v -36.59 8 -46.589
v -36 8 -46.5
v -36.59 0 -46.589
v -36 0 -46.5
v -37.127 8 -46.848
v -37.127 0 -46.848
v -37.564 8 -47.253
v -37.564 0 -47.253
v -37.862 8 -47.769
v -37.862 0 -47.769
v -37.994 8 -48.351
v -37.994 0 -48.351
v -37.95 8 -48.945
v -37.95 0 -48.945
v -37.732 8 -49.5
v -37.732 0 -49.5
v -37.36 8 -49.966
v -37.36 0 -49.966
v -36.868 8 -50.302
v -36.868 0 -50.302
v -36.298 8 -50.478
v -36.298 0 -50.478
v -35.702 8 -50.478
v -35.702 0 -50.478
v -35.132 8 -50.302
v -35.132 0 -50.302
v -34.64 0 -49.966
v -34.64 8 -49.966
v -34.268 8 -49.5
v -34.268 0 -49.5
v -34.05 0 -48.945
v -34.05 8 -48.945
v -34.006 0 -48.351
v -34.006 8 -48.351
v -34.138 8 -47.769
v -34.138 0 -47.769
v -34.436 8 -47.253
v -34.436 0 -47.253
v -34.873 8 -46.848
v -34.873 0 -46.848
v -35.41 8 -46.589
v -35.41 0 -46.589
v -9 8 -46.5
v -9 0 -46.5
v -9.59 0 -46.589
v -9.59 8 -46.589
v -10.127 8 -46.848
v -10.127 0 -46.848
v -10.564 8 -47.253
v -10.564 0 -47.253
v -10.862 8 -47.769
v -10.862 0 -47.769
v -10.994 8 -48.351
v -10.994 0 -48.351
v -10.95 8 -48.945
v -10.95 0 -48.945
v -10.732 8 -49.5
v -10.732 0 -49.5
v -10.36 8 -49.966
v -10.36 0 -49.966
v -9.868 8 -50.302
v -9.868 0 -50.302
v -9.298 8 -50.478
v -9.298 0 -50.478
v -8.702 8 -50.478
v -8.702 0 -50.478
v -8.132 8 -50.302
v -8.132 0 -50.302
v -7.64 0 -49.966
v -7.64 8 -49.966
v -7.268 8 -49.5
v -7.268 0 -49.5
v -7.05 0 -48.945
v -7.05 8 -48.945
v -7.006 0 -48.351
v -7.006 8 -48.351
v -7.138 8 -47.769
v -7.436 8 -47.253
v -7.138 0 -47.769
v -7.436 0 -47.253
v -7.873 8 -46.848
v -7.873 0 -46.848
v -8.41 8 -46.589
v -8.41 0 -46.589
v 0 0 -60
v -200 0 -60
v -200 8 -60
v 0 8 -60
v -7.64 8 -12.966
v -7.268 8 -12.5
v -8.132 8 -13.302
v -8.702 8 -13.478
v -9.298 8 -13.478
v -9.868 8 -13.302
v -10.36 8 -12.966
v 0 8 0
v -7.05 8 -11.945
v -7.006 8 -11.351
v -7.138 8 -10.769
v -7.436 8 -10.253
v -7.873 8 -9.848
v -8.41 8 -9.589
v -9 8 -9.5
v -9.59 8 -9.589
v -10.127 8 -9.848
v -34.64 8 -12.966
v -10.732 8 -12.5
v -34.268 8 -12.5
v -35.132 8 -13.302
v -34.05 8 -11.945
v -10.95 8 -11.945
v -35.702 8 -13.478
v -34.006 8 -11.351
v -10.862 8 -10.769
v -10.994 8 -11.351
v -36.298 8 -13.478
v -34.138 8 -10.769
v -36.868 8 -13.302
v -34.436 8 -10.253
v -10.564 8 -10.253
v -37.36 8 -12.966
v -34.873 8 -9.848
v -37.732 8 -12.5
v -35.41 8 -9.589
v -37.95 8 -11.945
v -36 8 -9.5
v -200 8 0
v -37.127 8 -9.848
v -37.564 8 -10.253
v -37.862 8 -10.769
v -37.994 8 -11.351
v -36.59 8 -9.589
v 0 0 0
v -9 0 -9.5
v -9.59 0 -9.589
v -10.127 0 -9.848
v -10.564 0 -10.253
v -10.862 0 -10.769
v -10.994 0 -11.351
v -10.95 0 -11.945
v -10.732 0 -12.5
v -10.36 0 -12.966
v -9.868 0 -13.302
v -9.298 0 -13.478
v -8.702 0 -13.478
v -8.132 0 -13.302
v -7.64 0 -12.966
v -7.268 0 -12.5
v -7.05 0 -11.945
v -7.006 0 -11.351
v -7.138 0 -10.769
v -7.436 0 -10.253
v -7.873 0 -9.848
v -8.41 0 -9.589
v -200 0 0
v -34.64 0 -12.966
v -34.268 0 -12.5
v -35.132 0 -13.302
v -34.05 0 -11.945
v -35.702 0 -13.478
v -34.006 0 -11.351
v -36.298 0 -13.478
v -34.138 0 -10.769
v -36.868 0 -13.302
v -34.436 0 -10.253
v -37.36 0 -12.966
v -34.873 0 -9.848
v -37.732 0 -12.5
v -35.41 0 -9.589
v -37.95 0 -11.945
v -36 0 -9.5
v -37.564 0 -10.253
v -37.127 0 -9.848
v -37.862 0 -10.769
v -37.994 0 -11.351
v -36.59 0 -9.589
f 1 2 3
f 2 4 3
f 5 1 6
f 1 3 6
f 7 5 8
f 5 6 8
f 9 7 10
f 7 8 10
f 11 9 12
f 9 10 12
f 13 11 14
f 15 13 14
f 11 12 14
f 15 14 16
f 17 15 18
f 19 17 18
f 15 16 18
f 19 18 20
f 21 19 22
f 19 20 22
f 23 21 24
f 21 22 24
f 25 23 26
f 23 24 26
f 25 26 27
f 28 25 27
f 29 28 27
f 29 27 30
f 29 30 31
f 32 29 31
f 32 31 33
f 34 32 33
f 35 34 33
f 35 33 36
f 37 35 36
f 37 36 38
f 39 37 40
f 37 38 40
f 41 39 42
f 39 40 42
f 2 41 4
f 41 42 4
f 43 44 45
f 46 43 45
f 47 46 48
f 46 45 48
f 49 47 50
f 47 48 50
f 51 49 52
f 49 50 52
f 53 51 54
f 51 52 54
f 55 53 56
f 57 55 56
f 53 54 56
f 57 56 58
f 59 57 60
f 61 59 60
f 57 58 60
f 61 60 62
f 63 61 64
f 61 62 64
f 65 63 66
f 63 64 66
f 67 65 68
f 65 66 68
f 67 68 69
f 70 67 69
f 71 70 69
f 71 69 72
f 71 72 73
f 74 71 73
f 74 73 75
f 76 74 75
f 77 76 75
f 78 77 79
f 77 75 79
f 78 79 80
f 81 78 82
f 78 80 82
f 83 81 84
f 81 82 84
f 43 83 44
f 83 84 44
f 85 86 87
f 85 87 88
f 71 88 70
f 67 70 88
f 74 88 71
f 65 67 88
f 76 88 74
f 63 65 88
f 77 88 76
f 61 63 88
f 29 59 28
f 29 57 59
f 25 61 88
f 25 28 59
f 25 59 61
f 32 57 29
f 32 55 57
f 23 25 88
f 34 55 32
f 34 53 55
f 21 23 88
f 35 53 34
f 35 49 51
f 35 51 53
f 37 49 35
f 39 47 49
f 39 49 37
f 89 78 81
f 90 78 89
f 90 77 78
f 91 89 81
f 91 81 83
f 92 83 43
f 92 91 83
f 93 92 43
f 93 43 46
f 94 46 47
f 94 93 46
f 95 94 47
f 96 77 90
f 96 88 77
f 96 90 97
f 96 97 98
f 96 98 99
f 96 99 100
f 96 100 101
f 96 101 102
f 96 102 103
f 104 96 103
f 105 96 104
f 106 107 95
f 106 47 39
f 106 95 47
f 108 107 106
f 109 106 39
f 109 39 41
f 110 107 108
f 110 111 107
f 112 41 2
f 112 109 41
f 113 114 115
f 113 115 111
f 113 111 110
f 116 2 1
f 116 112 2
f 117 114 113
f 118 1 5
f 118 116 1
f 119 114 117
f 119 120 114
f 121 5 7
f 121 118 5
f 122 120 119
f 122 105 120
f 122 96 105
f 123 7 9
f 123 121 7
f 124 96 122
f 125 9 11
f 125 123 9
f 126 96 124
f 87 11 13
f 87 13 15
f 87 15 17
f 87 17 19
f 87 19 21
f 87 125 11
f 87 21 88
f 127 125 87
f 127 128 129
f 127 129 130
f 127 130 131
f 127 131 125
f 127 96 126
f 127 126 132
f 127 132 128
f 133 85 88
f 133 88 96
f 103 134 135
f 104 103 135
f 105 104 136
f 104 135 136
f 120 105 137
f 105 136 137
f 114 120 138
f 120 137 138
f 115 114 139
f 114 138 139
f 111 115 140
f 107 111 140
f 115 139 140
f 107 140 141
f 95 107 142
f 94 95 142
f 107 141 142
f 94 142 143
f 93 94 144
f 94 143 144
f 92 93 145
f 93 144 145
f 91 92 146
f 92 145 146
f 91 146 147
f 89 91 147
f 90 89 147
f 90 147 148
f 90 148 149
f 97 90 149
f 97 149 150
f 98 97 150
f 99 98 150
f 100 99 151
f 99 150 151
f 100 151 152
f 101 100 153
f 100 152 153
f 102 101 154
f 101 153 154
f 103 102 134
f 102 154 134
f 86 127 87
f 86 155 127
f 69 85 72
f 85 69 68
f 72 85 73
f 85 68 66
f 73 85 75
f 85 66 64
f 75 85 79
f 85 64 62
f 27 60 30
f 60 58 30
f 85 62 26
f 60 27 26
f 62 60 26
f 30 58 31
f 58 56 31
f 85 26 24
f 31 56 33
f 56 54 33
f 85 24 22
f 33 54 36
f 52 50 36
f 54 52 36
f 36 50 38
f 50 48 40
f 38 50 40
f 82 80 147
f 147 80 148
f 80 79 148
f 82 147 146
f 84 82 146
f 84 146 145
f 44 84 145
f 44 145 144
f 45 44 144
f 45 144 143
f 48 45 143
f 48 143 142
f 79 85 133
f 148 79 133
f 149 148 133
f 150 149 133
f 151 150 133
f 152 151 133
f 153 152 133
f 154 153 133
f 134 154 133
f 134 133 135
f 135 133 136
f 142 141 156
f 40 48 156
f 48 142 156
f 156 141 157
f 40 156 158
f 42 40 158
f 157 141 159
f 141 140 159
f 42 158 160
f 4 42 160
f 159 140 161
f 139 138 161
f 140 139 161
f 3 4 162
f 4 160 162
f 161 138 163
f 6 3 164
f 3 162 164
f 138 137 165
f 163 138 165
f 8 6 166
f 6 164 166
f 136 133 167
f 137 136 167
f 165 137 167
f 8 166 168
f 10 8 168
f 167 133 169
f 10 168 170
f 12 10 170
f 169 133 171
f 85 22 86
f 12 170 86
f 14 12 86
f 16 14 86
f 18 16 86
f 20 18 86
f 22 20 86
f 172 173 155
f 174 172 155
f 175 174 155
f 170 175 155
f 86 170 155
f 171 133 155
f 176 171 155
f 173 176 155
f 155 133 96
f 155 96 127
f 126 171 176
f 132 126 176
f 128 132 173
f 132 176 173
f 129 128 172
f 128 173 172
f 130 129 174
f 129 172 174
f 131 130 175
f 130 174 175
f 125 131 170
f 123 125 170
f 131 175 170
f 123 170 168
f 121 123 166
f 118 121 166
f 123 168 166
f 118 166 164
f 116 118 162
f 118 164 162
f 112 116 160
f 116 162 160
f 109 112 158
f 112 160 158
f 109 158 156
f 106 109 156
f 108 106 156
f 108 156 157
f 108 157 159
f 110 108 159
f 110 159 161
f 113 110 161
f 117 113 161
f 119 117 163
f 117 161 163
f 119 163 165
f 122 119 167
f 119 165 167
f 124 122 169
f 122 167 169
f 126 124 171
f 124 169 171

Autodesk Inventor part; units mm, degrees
ref_plane "YZ Plane" through (0, 0, 0) normal (1, 0, 0) x (0, 1, 0)
ref_plane "XZ Plane" through (0, 0, 0) normal (0, 1, 0) x (-1, 0, 0)
ref_plane "XY Plane" through (0, 0, 0) normal (0, 0, 1) x (1, 0, 0)
sketch "Sketch1" plane through (0, 0, 0) normal (0, 1, 0) x (-1, 0, 0)
  line L0 (0, 0) -> (200, 0)
  line L1 (200, 0) -> (200, -60)
  line L2 (200, -60) -> (0, -60)
  line L3 (0, -60) -> (0, 0)
  dimension "d0" = 200
  dimension "d1" = 60
extrude "Extrusion1" add sketch "Sketch1" along normal blind 8
sketch "Sketch2" plane through (0, 8, 0) normal (0, 1, 0) x (1, 0, 0)
  line L0 (-40, 7.5) -> (-40, 52.5)
  line L1 (-35, 42.75) -> (-35, 34.25)
  line L2 (-35, 34.25) -> (-34, 34.25)
  line L3 (-34, 34.25) -> (-34, 42.75)
  line L4 (-34, 42.75) -> (-35, 42.75)
  line L5 (-34, 25.75) -> (-35, 25.75)
  line L6 (-35, 25.75) -> (-35, 17.25)
  line L7 (-35, 17.25) -> (-34, 17.25)
  line L8 (-34, 17.25) -> (-34, 25.75)
  line L9 (-40, 7.5) -> (-5, 7.5)
  line L10 (-5, 52.5) -> (-40, 52.5)
  line L11 (-23.5275, 30) -> (-17.7049, 30) construction
  line L12 (-5, 52.5) -> (-5, 7.5)
  circle A0 centre (-36, 11.5) radius 1.5
  circle A1 centre (-9, 11.5) radius 1.5
  circle A2 centre (-36, 48.5) radius 1.5
  circle A3 centre (-9, 48.5) radius 1.5
  line L13 (-200, 0) -> (0, 0) construction
  line L14 (0, 0) -> (0, 60) construction
  point P0 (-35.5, 13)
  point P1 (-35.5, 30)
  point P2 (-35.5, 47)
  dimension "d4" = 8.5
  dimension "d5" = 1
  dimension "d6" = 5
  dimension "d7" = 17
  dimension "d8" = 17
  dimension "d9" = 4.25
  dimension "d10" = 4.25
  dimension "d11" = 4.5
  dimension "d12" = 35
  dimension "d13" = 45
  dimension "d14" = 3
  dimension "d15" = 4
  dimension "d16" = 4
  dimension "d17" = 4
  dimension "d18" = 4
  dimension "d19" = 7.5
  dimension "d20" = 5
hole "Hole1" at (-36, 8, -11.5) at (-36, 8, -48.5) at (-9, 8, -11.5) at (-9, 8, -48.5) direction (0, -1, 0) diameter 4 end through all
properties part number "Base"
